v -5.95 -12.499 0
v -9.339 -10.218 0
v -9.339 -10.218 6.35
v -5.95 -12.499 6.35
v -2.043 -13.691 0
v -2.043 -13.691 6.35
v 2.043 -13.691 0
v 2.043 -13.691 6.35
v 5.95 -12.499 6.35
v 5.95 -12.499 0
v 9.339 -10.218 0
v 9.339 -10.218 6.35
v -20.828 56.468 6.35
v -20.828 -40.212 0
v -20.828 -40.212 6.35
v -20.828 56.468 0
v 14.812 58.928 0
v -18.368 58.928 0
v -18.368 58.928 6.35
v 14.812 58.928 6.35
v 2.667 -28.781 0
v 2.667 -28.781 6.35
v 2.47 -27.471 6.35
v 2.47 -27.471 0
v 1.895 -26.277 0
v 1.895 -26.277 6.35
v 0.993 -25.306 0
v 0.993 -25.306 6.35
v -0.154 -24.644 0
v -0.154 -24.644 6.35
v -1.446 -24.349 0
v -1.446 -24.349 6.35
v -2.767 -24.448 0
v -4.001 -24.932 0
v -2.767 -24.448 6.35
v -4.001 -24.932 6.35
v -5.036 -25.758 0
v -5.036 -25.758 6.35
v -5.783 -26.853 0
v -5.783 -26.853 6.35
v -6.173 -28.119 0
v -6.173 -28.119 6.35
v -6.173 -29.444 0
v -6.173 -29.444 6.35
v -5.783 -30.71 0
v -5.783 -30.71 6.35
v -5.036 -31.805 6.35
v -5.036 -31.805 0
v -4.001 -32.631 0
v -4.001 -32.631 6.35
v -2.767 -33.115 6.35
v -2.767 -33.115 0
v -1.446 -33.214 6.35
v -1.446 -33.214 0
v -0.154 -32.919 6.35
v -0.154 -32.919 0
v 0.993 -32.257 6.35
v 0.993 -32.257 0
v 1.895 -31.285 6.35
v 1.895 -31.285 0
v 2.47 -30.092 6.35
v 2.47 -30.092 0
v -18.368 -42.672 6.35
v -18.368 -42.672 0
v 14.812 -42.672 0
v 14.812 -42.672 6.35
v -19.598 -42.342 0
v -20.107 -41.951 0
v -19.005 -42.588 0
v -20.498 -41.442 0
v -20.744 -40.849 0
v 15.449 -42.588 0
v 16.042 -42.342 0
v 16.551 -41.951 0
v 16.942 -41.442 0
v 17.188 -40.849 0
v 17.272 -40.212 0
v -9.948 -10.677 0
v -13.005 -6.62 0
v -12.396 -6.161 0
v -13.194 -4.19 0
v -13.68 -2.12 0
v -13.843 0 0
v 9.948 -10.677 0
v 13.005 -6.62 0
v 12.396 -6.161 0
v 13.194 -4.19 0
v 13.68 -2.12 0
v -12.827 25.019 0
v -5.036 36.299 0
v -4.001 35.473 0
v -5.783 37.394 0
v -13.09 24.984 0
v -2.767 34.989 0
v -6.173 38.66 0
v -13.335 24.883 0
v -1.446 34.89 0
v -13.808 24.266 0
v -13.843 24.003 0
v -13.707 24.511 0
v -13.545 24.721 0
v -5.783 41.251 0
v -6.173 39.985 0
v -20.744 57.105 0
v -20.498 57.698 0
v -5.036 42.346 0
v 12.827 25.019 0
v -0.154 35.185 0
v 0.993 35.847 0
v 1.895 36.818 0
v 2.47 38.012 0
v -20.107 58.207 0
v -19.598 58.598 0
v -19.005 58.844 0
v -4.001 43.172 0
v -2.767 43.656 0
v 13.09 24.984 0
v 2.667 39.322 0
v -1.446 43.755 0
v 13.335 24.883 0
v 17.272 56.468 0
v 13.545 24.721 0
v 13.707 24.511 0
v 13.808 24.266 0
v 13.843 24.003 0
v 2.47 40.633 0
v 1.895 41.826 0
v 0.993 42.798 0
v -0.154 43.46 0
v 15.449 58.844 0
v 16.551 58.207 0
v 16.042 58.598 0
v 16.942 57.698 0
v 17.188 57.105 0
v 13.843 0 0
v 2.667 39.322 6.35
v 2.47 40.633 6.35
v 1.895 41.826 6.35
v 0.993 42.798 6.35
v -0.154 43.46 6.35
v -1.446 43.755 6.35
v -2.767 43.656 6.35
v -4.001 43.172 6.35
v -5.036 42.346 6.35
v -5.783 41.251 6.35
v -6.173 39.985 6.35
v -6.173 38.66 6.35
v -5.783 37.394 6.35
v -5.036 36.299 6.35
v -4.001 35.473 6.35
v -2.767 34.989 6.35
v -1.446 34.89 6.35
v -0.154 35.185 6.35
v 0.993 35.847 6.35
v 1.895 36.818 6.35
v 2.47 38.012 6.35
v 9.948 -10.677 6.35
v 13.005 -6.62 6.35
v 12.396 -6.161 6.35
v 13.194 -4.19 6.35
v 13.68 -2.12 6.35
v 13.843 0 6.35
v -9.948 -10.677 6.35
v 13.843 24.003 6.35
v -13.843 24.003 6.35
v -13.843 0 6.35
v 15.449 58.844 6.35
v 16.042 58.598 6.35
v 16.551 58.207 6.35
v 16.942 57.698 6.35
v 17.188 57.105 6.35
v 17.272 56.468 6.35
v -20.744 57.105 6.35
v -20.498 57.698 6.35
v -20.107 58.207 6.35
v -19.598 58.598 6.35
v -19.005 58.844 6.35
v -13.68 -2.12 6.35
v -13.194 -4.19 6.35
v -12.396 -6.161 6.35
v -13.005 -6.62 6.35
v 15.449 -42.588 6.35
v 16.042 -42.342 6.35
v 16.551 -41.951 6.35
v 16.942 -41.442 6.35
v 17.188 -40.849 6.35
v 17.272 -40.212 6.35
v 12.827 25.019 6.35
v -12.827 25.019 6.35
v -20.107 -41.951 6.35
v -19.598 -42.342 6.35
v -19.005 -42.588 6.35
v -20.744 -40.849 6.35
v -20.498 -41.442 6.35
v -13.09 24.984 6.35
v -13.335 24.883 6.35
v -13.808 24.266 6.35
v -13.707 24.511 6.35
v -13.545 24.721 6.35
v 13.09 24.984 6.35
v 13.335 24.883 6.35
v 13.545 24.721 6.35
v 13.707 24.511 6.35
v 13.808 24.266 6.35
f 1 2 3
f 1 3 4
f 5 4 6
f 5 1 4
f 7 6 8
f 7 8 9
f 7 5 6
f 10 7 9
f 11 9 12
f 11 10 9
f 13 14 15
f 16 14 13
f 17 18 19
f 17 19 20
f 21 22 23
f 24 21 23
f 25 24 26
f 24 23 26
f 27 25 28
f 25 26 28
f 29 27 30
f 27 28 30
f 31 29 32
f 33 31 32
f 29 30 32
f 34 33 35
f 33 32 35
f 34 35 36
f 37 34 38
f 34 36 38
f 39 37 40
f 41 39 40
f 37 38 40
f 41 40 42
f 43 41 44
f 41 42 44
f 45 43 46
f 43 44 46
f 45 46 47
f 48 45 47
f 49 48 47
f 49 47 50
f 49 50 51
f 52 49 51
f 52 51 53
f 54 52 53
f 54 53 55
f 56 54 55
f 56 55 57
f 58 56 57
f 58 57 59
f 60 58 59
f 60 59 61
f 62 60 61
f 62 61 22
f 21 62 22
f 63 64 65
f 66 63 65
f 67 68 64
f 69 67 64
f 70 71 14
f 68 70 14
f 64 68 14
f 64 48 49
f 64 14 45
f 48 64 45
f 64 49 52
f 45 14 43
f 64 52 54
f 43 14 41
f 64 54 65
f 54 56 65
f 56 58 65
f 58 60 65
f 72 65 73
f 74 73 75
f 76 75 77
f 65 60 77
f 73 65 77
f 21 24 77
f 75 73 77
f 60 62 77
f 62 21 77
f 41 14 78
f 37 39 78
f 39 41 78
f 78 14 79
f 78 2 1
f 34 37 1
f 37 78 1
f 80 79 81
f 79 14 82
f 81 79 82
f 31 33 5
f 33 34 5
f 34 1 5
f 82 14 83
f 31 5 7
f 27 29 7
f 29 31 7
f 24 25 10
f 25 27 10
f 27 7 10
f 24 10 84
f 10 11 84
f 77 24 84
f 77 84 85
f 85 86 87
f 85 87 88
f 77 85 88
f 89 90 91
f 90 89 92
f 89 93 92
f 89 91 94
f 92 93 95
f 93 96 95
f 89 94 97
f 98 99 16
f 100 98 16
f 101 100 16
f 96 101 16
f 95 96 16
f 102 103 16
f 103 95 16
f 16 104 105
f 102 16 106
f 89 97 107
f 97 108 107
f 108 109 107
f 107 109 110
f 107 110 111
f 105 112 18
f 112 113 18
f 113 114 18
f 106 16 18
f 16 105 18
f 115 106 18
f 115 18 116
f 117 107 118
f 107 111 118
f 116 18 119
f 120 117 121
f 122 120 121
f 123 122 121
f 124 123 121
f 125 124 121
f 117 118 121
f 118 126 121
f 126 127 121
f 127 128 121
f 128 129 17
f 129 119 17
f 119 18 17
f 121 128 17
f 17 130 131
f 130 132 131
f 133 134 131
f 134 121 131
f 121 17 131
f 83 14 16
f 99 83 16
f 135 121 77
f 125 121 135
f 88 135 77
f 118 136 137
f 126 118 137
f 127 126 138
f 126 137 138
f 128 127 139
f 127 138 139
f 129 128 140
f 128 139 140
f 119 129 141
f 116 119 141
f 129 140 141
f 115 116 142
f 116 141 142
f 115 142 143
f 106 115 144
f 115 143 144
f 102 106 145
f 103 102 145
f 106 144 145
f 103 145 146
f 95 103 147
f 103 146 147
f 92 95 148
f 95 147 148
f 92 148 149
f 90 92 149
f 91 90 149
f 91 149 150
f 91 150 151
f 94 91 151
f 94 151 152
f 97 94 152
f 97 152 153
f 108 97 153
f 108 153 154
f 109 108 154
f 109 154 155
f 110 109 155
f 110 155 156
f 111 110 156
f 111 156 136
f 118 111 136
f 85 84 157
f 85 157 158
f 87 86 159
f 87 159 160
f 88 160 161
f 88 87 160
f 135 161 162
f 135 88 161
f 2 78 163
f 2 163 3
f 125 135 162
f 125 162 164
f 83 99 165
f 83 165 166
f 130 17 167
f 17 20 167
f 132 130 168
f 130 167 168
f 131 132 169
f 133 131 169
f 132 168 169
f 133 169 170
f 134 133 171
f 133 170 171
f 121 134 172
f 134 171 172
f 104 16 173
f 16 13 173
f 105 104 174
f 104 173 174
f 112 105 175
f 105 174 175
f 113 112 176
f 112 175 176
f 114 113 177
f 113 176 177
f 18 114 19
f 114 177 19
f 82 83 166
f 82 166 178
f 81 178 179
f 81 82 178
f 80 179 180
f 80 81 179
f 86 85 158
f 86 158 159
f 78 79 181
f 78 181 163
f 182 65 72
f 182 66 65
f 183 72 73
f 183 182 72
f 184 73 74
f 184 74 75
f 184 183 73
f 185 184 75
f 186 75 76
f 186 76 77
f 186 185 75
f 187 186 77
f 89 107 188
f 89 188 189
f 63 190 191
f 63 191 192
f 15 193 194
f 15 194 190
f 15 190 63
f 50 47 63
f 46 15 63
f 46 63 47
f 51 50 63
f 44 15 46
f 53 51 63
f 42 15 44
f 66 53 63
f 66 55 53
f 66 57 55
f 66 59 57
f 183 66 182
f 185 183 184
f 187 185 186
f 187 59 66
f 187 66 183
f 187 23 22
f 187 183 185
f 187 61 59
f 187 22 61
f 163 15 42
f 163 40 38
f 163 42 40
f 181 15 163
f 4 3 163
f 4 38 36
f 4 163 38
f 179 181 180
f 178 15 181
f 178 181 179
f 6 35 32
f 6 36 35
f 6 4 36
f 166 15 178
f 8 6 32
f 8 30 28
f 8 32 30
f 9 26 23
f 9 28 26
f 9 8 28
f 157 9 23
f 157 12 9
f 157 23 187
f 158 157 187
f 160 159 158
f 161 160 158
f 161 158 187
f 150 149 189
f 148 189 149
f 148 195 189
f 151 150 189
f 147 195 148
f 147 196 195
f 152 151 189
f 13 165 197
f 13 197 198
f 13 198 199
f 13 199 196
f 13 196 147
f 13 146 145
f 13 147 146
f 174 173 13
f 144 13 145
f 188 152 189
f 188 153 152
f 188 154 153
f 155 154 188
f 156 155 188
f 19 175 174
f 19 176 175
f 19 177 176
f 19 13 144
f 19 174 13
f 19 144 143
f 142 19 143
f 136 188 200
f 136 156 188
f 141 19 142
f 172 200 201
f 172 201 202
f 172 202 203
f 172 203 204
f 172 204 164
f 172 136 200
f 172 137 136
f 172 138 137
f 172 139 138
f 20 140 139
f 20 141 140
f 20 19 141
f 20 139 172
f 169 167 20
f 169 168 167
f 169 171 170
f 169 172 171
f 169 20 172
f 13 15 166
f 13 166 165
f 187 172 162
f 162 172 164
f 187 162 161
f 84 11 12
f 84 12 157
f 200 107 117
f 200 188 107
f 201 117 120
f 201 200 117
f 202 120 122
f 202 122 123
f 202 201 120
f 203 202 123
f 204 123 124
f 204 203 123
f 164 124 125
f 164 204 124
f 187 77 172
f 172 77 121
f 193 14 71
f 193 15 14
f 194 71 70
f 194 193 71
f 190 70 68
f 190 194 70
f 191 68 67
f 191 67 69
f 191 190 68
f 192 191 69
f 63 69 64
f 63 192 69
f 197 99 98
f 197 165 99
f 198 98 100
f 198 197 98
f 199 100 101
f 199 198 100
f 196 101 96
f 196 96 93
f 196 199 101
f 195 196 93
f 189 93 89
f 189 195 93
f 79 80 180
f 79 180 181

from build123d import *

# Parameters (mm, degrees)
SKETCH1_W           = 38.1
SKETCH1_H           = 101.6
BOSS_EXTRUDE1_DEPTH = 6.35
CUT_EXTRUDE1_REACH  = 64.822
SKETCH2_R           = 4.445
FILLET5_R           = 1.016
FILLET6_R           = 2.46


with BuildPart() as part:
    # Sketch1 → Boss-Extrude1 (new body)
    with BuildSketch(Plane.XY):
        with Locations((-1.778, 8.128)):
            Rectangle(SKETCH1_W, SKETCH1_H)
        with BuildLine():
            Line((-13.843, 25.019), (-13.843, 0))
            ThreePointArc((-13.843, 0), (-13.476504522, -3.164249495), (-12.396424133, -6.16095104))
            Line((-12.396424133, -6.16095104), (-13.004984391, -6.619534088))
            Line((-13.004984391, -6.619534088), (-9.947764074, -10.676602479))
            Line((-9.947764074, -10.676602479), (-9.339203815, -10.218019431))
            ThreePointArc((-9.339203815, -10.218019431), (0, -13.843), (9.339203815, -10.218019431))
            Line((9.339203815, -10.218019431), (9.947764074, -10.676602479))
            Line((9.947764074, -10.676602479), (13.004984391, -6.619534088))
            Line((13.004984391, -6.619534088), (12.396424133, -6.16095104))
            ThreePointArc((12.396424133, -6.16095104), (13.476504522, -3.164249495), (13.843, 0))
            Line((13.843, 0), (13.843, 25.019))
            Line((13.843, 25.019), (-13.843, 25.019))
        make_face(mode=Mode.SUBTRACT)
    extrude(amount=BOSS_EXTRUDE1_DEPTH)

    # Sketch2 → Cut-Extrude1 (cut, up to next)
    with BuildSketch(Plane.XY.offset(6.35), mode=Mode.PRIVATE) as cut_extrude1_sk1:
        with Locations((-1.778, 39.322375)):
            Circle(SKETCH2_R)
    cut_extrude1_tool1 = extrude(cut_extrude1_sk1.sketch, amount=-CUT_EXTRUDE1_REACH, mode=Mode.PRIVATE) & part.part
    # Sketch2 → Cut-Extrude1 (cut, up to next)
    with BuildSketch(Plane.XY.offset(6.35), mode=Mode.PRIVATE) as cut_extrude1_sk2:
        with Locations((-1.778, -28.781375)):
            Circle(SKETCH2_R)
    cut_extrude1_tool2 = extrude(cut_extrude1_sk2.sketch, amount=-CUT_EXTRUDE1_REACH, mode=Mode.PRIVATE) & part.part
    add(cut_extrude1_tool1.solids().sort_by_distance((-1.778, 39.322375, 6.35))[0], mode=Mode.SUBTRACT)
    add(cut_extrude1_tool2.solids().sort_by_distance((-1.778, -28.781375, 6.35))[0], mode=Mode.SUBTRACT)

    # Fillet5
    fillet5_edges = [part.edges().sort_by_distance(p)[0] for p in [
        (13.843, 25.019, 3.175),
        (-13.843, 25.019, 3.175),
    ]]
    fillet(fillet5_edges, radius=FILLET5_R)

    # Fillet6
    fillet6_edges = [part.edges().sort_by_distance(p)[0] for p in [
        (-20.828, 58.928, 3.175),
        (17.272, 58.928, 3.175),
        (17.272, -42.672, 3.175),
        (-20.828, -42.672, 3.175),
    ]]
    fillet(fillet6_edges, radius=FILLET6_R)


solid = part.part
